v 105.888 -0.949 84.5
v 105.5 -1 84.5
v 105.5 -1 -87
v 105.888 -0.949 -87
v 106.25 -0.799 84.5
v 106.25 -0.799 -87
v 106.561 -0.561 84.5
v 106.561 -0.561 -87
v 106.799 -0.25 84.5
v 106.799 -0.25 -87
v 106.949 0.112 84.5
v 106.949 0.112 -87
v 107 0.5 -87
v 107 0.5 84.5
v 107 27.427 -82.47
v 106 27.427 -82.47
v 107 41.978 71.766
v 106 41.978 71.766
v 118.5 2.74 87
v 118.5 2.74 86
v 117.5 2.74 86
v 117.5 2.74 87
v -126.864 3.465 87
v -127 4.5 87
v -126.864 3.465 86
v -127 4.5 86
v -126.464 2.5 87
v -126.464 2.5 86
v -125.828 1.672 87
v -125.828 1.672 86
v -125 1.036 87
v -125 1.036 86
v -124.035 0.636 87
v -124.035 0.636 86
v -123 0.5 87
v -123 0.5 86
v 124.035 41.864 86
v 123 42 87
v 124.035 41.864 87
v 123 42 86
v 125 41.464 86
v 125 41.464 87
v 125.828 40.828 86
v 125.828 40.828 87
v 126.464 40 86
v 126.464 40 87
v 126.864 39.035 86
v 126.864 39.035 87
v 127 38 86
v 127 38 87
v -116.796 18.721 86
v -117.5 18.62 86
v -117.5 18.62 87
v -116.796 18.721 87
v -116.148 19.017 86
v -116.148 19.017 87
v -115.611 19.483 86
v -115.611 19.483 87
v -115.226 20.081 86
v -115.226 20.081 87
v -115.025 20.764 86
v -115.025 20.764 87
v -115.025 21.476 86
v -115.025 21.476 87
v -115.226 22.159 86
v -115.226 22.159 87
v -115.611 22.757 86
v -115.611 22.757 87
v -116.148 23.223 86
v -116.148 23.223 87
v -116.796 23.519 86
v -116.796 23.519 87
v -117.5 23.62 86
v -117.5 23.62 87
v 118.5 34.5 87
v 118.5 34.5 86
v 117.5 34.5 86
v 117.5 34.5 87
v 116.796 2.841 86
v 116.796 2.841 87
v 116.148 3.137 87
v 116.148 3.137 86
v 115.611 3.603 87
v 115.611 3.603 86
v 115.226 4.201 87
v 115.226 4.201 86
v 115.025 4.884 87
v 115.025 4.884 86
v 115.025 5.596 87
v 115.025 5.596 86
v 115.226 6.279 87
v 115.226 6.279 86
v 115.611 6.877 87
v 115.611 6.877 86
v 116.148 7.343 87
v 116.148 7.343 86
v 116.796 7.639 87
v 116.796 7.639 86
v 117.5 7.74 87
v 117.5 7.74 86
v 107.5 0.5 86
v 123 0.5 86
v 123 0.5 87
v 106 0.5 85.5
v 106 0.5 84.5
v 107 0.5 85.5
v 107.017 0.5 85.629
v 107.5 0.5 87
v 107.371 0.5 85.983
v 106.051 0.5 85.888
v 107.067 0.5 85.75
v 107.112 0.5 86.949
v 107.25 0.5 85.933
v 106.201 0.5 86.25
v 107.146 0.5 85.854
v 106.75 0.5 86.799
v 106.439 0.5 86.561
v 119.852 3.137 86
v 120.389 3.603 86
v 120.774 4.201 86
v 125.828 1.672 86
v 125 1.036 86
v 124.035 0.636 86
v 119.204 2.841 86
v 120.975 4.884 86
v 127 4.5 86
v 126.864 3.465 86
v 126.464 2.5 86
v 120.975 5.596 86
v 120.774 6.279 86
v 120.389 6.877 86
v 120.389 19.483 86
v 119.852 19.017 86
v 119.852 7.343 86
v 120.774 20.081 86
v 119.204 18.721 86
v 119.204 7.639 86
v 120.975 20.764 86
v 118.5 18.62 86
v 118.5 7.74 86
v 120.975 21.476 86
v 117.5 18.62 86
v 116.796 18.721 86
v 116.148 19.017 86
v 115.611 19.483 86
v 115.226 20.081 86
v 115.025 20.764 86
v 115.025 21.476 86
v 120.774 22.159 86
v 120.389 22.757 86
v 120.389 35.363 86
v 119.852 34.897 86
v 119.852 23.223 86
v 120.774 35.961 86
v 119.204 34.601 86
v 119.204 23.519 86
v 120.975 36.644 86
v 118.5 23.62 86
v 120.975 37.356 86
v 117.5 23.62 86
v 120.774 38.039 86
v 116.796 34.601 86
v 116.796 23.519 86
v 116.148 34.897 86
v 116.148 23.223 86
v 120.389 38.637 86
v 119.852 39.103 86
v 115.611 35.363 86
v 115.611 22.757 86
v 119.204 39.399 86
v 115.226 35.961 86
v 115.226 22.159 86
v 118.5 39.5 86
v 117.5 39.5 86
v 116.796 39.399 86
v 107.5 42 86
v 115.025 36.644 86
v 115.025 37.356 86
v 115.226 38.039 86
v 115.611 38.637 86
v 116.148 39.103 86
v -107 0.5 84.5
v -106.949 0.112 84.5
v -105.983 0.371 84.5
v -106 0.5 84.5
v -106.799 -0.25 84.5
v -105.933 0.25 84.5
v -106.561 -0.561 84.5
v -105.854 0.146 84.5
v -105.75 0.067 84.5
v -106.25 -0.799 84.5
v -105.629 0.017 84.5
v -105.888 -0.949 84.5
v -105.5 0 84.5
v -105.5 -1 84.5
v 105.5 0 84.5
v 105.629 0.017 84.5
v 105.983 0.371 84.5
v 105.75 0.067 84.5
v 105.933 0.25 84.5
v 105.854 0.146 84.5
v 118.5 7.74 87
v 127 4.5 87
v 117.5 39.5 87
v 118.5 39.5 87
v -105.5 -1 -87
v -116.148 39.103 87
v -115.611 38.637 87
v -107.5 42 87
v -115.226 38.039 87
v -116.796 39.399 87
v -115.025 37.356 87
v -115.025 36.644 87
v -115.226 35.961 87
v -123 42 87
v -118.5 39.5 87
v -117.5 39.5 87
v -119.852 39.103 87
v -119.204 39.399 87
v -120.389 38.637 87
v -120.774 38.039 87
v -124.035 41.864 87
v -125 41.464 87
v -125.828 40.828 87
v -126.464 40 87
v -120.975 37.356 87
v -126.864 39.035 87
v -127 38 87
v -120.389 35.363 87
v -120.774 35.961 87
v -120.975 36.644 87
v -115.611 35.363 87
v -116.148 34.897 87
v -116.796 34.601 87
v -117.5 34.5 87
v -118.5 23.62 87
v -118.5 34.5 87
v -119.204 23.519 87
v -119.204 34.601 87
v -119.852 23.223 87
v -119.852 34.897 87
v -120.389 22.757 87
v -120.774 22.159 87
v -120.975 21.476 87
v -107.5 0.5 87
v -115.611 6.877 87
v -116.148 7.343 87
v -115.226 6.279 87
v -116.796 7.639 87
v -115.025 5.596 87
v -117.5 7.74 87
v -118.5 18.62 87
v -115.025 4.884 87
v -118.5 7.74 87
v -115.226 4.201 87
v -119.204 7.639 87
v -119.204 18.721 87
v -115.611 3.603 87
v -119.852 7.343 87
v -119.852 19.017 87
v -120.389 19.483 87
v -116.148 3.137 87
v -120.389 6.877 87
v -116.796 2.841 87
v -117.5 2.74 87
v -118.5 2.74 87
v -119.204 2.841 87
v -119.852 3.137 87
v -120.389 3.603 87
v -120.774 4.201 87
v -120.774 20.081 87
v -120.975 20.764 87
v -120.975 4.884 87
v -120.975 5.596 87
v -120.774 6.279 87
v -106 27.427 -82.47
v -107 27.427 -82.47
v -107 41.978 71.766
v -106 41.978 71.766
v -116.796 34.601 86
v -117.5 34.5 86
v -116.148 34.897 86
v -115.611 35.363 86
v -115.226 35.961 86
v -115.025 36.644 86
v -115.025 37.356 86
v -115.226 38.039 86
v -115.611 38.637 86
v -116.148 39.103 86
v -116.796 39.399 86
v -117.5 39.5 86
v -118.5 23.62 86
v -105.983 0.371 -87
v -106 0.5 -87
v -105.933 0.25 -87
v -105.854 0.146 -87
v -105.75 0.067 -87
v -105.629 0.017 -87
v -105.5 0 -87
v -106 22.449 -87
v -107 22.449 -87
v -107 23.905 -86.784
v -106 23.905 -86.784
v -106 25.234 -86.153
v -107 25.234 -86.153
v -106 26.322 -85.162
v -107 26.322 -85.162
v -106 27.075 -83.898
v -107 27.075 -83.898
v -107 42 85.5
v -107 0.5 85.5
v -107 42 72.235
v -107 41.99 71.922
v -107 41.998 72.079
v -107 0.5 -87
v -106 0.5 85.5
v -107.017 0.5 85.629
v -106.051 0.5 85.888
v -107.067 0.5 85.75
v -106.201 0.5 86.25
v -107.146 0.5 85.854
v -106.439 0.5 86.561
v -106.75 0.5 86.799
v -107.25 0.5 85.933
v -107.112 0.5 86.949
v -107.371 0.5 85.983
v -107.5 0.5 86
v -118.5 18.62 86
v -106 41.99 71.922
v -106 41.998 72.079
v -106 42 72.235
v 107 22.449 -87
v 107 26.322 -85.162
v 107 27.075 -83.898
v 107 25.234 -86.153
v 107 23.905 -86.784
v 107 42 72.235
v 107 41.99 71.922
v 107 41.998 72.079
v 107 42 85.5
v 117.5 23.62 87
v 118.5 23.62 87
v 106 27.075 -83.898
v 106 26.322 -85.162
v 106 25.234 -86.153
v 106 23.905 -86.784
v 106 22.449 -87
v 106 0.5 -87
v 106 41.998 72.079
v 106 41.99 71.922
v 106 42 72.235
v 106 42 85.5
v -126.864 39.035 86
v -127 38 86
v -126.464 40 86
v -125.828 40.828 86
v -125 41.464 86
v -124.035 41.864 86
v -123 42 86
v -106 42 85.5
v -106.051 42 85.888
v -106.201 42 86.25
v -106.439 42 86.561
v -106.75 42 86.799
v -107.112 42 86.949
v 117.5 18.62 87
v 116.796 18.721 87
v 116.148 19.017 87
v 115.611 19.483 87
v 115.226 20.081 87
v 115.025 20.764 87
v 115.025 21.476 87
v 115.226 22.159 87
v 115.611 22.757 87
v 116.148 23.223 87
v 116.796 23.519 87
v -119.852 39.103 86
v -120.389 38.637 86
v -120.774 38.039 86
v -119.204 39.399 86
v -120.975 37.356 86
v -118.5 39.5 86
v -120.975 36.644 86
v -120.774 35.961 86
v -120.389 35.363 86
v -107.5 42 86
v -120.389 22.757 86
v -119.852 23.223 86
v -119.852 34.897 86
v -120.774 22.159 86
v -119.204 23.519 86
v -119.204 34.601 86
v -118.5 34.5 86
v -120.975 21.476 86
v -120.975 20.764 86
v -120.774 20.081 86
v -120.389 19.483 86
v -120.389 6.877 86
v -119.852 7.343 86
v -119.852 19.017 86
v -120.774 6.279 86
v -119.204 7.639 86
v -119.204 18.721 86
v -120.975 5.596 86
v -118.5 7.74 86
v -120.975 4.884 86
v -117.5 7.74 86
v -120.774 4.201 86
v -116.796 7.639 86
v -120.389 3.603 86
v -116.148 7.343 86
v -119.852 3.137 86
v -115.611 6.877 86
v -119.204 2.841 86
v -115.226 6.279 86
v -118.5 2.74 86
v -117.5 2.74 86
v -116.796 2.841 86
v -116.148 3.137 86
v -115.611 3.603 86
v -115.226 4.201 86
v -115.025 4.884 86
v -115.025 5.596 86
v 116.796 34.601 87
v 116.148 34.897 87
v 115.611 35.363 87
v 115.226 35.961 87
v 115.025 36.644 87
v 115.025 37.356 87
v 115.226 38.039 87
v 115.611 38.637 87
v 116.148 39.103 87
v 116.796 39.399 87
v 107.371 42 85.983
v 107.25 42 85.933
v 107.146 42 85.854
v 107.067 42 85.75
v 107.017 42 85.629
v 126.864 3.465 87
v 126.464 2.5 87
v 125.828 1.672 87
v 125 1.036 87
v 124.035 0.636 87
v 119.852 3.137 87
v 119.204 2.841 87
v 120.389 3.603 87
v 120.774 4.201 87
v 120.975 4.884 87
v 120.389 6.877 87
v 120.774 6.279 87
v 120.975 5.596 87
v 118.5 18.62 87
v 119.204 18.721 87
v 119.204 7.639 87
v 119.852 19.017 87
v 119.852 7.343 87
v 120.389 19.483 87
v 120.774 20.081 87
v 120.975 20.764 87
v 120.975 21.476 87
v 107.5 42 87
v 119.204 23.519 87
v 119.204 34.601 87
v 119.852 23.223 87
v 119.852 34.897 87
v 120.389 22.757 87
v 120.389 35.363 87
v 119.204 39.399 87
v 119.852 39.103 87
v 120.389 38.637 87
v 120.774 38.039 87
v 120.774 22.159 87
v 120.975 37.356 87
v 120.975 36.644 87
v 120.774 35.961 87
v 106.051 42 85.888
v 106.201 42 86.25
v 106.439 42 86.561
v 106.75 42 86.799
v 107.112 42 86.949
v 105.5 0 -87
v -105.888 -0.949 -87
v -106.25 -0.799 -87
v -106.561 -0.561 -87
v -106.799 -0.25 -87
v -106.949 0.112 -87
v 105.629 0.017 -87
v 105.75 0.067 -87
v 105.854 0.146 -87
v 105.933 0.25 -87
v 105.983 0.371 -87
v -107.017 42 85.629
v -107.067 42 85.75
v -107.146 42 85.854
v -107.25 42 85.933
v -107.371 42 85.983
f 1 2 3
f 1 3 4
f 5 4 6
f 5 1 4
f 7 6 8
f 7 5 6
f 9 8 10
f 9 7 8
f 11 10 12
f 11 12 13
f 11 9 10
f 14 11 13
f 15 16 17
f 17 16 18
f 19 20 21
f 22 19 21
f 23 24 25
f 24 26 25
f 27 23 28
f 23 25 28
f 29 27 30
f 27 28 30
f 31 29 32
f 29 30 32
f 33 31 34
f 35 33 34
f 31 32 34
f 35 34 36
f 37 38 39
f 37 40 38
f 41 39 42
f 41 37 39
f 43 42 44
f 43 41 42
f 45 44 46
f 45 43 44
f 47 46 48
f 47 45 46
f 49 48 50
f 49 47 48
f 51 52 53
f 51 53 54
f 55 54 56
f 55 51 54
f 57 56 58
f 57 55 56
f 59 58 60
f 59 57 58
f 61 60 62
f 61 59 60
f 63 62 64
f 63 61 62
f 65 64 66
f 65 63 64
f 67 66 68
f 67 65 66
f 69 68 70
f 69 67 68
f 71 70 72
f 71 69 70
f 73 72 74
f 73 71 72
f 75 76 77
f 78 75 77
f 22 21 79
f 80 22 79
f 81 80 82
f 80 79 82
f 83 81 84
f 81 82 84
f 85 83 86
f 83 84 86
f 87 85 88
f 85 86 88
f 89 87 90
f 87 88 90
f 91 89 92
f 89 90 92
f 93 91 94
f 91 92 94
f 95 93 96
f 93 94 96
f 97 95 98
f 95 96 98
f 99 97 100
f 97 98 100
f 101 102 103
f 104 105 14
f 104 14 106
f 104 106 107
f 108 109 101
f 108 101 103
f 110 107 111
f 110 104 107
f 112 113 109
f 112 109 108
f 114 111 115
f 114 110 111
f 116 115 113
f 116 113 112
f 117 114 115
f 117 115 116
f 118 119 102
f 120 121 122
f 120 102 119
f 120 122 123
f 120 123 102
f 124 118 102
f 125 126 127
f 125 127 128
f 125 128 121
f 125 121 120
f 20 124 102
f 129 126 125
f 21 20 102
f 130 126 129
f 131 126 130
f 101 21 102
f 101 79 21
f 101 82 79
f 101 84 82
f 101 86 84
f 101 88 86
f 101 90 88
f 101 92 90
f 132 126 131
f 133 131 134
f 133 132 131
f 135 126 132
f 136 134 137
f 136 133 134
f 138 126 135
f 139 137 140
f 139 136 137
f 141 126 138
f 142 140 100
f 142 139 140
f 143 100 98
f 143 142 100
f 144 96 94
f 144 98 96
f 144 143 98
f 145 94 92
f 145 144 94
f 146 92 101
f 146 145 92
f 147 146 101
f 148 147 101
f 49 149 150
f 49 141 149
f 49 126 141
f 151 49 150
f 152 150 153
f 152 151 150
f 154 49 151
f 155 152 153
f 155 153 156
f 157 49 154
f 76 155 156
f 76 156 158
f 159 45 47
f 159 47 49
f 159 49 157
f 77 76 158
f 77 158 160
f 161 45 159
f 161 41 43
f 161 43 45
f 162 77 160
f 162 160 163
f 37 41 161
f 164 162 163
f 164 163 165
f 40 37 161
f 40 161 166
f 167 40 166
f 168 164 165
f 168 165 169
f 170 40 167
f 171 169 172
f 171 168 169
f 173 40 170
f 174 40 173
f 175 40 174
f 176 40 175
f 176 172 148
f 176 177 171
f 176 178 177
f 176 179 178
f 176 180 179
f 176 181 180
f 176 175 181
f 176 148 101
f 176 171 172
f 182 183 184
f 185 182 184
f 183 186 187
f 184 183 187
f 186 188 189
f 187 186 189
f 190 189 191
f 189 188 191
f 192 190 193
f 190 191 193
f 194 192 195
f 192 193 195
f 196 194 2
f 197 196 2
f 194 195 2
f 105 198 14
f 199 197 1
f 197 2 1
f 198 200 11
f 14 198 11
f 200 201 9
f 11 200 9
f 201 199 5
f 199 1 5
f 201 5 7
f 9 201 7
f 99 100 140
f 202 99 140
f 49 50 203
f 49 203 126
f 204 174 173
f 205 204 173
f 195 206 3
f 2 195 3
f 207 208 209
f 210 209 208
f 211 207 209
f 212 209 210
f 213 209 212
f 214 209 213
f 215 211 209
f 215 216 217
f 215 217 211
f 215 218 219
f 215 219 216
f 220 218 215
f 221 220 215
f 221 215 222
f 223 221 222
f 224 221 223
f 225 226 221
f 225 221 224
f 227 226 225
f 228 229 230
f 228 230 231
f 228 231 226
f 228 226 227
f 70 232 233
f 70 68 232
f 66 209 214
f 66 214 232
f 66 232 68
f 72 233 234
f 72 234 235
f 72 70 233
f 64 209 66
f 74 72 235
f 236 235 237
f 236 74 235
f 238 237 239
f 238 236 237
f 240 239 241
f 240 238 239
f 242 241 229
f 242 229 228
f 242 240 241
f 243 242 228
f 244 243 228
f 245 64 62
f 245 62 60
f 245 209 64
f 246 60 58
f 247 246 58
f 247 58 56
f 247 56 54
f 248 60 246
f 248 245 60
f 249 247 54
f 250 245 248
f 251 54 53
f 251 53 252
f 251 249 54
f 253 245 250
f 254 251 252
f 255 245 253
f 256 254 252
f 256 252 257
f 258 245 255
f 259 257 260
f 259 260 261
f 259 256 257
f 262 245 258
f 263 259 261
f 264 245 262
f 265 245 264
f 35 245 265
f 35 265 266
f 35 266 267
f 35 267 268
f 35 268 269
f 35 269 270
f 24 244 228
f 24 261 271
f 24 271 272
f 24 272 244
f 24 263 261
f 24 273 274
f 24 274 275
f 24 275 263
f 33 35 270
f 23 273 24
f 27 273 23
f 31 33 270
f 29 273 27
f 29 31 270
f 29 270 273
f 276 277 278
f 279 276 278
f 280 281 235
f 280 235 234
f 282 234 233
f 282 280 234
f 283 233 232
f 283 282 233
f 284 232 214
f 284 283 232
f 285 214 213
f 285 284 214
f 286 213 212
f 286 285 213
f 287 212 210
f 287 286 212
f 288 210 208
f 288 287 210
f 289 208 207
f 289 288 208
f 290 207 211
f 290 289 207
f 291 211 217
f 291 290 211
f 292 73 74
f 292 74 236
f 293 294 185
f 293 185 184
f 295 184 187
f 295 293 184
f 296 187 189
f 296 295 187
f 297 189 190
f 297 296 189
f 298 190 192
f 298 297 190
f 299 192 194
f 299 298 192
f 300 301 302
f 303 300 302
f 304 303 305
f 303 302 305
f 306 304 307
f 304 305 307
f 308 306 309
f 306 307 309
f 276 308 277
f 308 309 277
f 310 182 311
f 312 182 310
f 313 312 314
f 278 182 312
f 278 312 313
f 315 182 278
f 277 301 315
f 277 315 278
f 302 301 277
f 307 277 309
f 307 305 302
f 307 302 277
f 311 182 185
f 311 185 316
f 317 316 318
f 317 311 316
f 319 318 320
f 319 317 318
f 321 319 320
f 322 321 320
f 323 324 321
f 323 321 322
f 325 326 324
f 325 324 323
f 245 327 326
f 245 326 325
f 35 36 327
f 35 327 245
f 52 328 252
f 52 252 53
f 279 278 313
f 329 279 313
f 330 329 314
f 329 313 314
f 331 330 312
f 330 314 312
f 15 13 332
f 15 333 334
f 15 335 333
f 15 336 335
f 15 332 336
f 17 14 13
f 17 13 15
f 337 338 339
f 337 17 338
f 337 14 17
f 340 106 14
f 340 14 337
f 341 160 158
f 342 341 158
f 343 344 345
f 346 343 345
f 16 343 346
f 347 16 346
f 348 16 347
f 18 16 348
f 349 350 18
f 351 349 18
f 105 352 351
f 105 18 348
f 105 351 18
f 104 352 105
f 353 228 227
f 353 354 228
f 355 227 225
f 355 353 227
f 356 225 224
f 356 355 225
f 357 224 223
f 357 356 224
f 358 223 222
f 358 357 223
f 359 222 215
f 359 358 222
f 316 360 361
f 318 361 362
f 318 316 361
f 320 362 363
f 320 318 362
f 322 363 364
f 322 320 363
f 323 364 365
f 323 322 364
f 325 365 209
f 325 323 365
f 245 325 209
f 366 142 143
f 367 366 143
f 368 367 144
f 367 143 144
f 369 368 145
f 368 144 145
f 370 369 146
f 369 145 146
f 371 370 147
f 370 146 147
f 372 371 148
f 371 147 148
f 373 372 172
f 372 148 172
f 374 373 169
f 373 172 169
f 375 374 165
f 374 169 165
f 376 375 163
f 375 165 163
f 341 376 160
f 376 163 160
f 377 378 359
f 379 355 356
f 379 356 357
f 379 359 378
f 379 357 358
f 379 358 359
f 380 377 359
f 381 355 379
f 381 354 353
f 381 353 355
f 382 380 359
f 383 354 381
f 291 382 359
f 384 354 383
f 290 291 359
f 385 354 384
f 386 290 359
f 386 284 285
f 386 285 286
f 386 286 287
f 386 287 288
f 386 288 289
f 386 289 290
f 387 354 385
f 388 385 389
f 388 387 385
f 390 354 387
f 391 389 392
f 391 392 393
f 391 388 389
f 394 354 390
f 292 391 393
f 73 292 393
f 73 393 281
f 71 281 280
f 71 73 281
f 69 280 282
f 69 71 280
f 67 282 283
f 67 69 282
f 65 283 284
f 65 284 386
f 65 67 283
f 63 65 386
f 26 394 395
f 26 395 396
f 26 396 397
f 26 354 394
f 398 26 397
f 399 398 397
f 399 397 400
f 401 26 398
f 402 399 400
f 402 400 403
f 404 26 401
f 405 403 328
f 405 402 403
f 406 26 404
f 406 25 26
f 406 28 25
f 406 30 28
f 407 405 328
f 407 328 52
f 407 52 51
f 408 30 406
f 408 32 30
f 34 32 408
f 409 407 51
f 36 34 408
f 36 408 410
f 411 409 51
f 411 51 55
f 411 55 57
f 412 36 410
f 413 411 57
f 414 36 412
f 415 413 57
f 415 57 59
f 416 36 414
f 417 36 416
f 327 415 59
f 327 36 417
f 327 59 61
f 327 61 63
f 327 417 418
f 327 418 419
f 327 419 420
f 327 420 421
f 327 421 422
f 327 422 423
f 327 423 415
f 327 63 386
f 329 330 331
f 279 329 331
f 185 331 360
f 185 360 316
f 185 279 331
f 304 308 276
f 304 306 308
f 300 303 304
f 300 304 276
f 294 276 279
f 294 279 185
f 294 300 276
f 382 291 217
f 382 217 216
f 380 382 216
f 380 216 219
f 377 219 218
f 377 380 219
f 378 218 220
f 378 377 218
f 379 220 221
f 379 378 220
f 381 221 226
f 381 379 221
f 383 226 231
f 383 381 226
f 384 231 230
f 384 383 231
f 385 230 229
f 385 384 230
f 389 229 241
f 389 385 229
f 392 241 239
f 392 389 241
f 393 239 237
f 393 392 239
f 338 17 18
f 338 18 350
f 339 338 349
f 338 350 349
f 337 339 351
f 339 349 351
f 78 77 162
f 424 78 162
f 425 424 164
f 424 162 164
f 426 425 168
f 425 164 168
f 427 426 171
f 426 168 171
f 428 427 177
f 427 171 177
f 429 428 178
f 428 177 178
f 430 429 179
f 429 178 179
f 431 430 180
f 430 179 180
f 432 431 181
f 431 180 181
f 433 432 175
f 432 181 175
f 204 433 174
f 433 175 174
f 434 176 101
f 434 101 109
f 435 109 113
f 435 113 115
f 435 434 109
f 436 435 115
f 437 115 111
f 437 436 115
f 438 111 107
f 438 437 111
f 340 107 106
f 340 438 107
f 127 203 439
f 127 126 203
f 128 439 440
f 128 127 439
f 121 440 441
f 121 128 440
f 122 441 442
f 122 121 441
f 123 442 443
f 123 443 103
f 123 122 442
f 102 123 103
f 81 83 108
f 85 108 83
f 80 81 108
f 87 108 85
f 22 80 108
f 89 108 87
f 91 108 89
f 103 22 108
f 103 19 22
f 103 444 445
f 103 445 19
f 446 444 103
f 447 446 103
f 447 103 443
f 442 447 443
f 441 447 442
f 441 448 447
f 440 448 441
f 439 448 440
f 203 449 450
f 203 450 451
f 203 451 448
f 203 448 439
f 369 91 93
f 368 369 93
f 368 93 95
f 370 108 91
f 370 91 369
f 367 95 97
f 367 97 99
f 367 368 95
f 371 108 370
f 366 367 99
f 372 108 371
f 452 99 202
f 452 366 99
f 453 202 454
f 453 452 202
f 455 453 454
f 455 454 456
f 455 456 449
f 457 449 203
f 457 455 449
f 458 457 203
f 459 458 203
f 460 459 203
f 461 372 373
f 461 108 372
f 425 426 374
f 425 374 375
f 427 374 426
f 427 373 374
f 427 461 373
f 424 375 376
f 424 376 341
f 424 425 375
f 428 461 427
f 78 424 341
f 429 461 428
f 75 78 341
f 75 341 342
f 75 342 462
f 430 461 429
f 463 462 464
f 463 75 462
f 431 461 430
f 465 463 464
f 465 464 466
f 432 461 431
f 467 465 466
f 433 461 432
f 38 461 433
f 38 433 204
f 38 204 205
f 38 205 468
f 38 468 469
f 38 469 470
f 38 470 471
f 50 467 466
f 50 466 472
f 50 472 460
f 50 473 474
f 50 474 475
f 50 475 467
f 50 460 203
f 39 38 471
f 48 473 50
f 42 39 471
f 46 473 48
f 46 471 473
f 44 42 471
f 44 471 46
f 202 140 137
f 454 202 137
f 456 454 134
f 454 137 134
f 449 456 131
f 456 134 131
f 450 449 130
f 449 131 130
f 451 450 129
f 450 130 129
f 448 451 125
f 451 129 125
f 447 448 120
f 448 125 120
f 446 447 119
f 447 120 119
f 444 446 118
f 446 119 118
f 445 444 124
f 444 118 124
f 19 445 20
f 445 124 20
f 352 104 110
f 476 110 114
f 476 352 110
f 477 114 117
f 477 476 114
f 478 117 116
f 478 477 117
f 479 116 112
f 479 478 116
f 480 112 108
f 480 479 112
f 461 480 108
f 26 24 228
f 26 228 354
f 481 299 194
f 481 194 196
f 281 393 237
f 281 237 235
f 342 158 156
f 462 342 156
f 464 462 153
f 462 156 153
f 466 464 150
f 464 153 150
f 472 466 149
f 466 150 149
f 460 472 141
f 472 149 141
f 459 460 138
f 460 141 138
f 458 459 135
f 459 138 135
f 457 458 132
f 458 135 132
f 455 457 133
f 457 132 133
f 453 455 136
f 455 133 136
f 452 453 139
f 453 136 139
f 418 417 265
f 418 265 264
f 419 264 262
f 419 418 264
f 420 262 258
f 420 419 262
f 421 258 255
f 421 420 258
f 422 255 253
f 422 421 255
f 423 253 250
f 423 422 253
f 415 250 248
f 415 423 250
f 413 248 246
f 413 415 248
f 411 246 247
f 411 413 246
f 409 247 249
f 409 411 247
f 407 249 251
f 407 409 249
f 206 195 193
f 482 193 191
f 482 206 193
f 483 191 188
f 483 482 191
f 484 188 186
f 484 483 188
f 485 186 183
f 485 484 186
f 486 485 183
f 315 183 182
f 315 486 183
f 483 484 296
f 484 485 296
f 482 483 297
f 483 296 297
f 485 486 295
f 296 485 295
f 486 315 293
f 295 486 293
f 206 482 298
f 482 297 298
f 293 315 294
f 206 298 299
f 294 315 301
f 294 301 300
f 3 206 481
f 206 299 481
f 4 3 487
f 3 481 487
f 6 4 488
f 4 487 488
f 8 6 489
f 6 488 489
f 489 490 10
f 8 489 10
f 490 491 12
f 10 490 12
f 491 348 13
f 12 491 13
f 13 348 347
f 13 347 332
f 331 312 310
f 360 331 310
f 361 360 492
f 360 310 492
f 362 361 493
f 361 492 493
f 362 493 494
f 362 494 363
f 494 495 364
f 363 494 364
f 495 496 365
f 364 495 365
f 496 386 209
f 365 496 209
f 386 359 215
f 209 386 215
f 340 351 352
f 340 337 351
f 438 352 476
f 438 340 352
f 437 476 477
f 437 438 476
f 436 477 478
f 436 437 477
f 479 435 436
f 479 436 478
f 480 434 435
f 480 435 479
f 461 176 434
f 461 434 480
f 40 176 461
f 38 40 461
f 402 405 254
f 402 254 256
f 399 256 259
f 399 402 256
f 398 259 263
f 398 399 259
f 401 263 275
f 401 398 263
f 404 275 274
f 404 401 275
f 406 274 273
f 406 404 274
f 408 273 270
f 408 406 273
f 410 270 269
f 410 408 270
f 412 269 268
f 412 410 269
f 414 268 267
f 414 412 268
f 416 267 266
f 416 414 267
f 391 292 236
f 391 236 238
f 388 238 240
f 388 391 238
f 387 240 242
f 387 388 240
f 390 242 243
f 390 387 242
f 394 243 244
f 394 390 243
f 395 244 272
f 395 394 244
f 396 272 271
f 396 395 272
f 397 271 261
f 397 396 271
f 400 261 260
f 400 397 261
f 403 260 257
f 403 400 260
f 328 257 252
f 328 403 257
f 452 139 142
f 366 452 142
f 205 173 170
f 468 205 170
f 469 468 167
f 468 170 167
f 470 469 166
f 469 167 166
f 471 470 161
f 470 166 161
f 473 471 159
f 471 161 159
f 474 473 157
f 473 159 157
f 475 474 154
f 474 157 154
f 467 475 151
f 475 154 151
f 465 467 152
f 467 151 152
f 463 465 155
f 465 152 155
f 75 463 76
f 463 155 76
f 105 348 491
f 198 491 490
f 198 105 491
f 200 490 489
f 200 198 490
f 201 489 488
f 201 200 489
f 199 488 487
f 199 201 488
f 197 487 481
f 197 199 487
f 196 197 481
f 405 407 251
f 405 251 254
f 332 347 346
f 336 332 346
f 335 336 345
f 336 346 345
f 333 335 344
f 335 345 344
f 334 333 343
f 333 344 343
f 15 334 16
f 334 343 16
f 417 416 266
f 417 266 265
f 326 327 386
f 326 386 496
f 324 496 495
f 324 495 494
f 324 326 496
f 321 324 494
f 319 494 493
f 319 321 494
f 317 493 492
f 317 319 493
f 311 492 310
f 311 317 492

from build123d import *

# Parameters (mm, degrees)
SKETCH1_W                    = 214
SKETCH1_H                    = 174
BASE_FLANGE1_DEPTH           = 1
EDGE_FLANGE3_STRIP_W         = 5
EDGE_FLANGE3_STRIP_H         = 1
EDGE_FLANGE3_STRIP_CUT_DEPTH = 174
EDGE_FLANGE3_DEPTH           = 174
EDGE_FLANGE4_STRIP_W         = 5
EDGE_FLANGE4_STRIP_H         = 1
EDGE_FLANGE4_STRIP_CUT_DEPTH = 174
EDGE_FLANGE4_DEPTH           = 174
EDGE_FLANGE5_STRIP_W         = 5
EDGE_FLANGE5_STRIP_H         = 1
EDGE_FLANGE5_STRIP_CUT_DEPTH = 41.5
EDGE_FLANGE5_DEPTH           = 41.5
EDGE_FLANGE6_STRIP_W         = 5
EDGE_FLANGE6_STRIP_H         = 1
EDGE_FLANGE6_STRIP_CUT_DEPTH = 41.5
EDGE_FLANGE6_DEPTH           = 41.5
FILLET1_R                    = 4
CUT_EXTRUDE1_REACH           = 161.834
SKETCH24_W                   = 214
SKETCH24_H                   = 2.5
SKETCH26_R                   = 2.5
CUT_EXTRUDE2_DEPTH           = 10
CHAMFER1_SIZE                = 1
CUT_EXTRUDE8_DEPTH           = 219.682418132
CUT_EXTRUDE9_DEPTH           = 254.158053397
FILLET2_R                    = 5


# Sheet-metal steps are written as plain solids
with BuildPart() as part:
    # Sketch1 → Base-Flange1 (new body)
    with BuildSketch(Plane(origin=(0, 0, 0), x_dir=(1, 0, 0), z_dir=(0, 1, 0))):
        Rectangle(SKETCH1_W, SKETCH1_H)
    extrude(amount=-BASE_FLANGE1_DEPTH)

    # Edge-Flange3 strip (across the edge) → Edge-Flange3 strip cut (cut)
    with BuildSketch(Plane(origin=(-107, 0, -87), x_dir=(1, 0, 0), z_dir=(0, 0, 1))):
        with Locations((-1, -0.5)):
            Rectangle(EDGE_FLANGE3_STRIP_W, EDGE_FLANGE3_STRIP_H)
    extrude(amount=EDGE_FLANGE3_STRIP_CUT_DEPTH, mode=Mode.SUBTRACT)

    # Edge-Flange3 section (across the edge) → Edge-Flange3 (add)
    with BuildSketch(Plane(origin=(-107, 0, -87), x_dir=(1, 0, 0), z_dir=(0, 0, 1))):
        with BuildLine():
            Line((0, 0.5), (0, 42))
            Line((0, 42), (1, 42))
            Line((1, 42), (1, 0.5))
            ThreePointArc((1, 0.5), (1.146446609, 0.146446609), (1.5, 0))
            Line((1.5, 0), (1.5, -1))
            ThreePointArc((1.5, -1), (0.439339828, -0.560660172), (0, 0.5))
        make_face()
    extrude(amount=EDGE_FLANGE3_DEPTH)

    # Edge-Flange4 strip (across the edge) → Edge-Flange4 strip cut (cut)
    with BuildSketch(Plane(origin=(107, 0, 87), x_dir=(-1, 0, 0), z_dir=(0, 0, -1))):
        with Locations((-1, -0.5)):
            Rectangle(EDGE_FLANGE4_STRIP_W, EDGE_FLANGE4_STRIP_H)
    extrude(amount=EDGE_FLANGE4_STRIP_CUT_DEPTH, mode=Mode.SUBTRACT)

    # Edge-Flange4 section (across the edge) → Edge-Flange4 (add)
    with BuildSketch(Plane(origin=(107, 0, 87), x_dir=(-1, 0, 0), z_dir=(0, 0, -1))):
        with BuildLine():
            Line((0, 0.5), (0, 42))
            Line((0, 42), (1, 42))
            Line((1, 42), (1, 0.5))
            ThreePointArc((1, 0.5), (1.146446609, 0.146446609), (1.5, 0))
            Line((1.5, 0), (1.5, -1))
            ThreePointArc((1.5, -1), (0.439339828, -0.560660172), (0, 0.5))
        make_face()
    extrude(amount=EDGE_FLANGE4_DEPTH)

    # Edge-Flange5 strip (across the edge) → Edge-Flange5 strip cut (cut)
    with BuildSketch(Plane(origin=(107, 42, 87), x_dir=(0, 0, -1), z_dir=(0, -1, 0))):
        with Locations((-1, -0.5)):
            Rectangle(EDGE_FLANGE5_STRIP_W, EDGE_FLANGE5_STRIP_H)
    extrude(amount=EDGE_FLANGE5_STRIP_CUT_DEPTH, mode=Mode.SUBTRACT)

    # Edge-Flange5 section (across the edge) → Edge-Flange5 (add)
    with BuildSketch(Plane(origin=(107, 42, 87), x_dir=(0, 0, -1), z_dir=(0, -1, 0))):
        with BuildLine():
            Line((0, 0.5), (0, 20))
            Line((0, 20), (1, 20))
            Line((1, 20), (1, 0.5))
            ThreePointArc((1, 0.5), (1.146446609, 0.146446609), (1.5, 0))
            Line((1.5, 0), (1.5, -1))
            ThreePointArc((1.5, -1), (0.439339828, -0.560660172), (0, 0.5))
        make_face()
    extrude(amount=EDGE_FLANGE5_DEPTH)

    # Edge-Flange6 strip (across the edge) → Edge-Flange6 strip cut (cut)
    with BuildSketch(Plane(origin=(-107, 0.5, 87), x_dir=(0, 0, -1), z_dir=(0, 1, 0))):
        with Locations((-1, -0.5)):
            Rectangle(EDGE_FLANGE6_STRIP_W, EDGE_FLANGE6_STRIP_H)
    extrude(amount=EDGE_FLANGE6_STRIP_CUT_DEPTH, mode=Mode.SUBTRACT)

    # Edge-Flange6 section (across the edge) → Edge-Flange6 (add)
    with BuildSketch(Plane(origin=(-107, 0.5, 87), x_dir=(0, 0, -1), z_dir=(0, 1, 0))):
        with BuildLine():
            Line((0, 0.5), (0, 20))
            Line((0, 20), (1, 20))
            Line((1, 20), (1, 0.5))
            ThreePointArc((1, 0.5), (1.146446609, 0.146446609), (1.5, 0))
            Line((1.5, 0), (1.5, -1))
            ThreePointArc((1.5, -1), (0.439339828, -0.560660172), (0, 0.5))
        make_face()
    extrude(amount=EDGE_FLANGE6_DEPTH)

    # Fillet1
    fillet1_edges = [part.edges().sort_by_distance(p)[0] for p in [
        (127, 42, 86.5),
        (127, 0.5, 86.5),
        (-127, 0.5, 86.5),
        (-127, 42, 86.5),
    ]]
    fillet(fillet1_edges, radius=FILLET1_R)

    # Cut-Extrude1: up to this face of the body (flat: up to its plane)
    cut_extrude1_end = Plane(part.part.faces().sort_by_distance((114.980552593, 0.5, 86.497536063))[0])
    # Sketch24 → Cut-Extrude1 (cut, up to the picked face)
    with BuildSketch(Plane.XZ.offset(1), mode=Mode.PRIVATE) as cut_extrude1_sk1:
        with Locations((0, 85.75)):
            Rectangle(SKETCH24_W, SKETCH24_H)
    cut_extrude1_tool1 = split(extrude(cut_extrude1_sk1.sketch, amount=-CUT_EXTRUDE1_REACH, mode=Mode.PRIVATE), bisect_by=cut_extrude1_end, keep=Keep.BOTH, mode=Mode.PRIVATE)
    add(cut_extrude1_tool1.solids().sort_by(Axis((0, -1, 85.75), (0, 1, 0)))[0], mode=Mode.SUBTRACT)

    # Sketch26 → Cut-Extrude2 (cut)
    with BuildSketch(Plane.XY.offset(87)):
        with Locations((-118, 37)):
            Circle(SKETCH26_R)
        with Locations((-118, 5.24)):
            Circle(SKETCH26_R)
        with Locations((-118, 21.12)):
            Circle(SKETCH26_R)
        with Locations(Location((118, 5.24, 0), (0, 0, 180))):
            Circle(SKETCH26_R)
        with Locations(Location((118, 21.12, 0), (0, 0, 180))):
            Circle(SKETCH26_R)
        with Locations(Location((118, 37, 0), (0, 0, 180))):
            Circle(SKETCH26_R)
    extrude(amount=-CUT_EXTRUDE2_DEPTH, mode=Mode.SUBTRACT)

    # Chamfer1
    chamfer1_edges = [part.edges().sort_by_distance(p)[0] for p in [
        (-106.5, 42, -87),
        (106.5, 42, -87),
    ]]
    chamfer(chamfer1_edges, length=CHAMFER1_SIZE)

    # Sketch32 → Cut-Extrude8 (cut, through all)
    with BuildSketch(Plane(origin=(0, 0, 86), x_dir=(-1, 0, 0), z_dir=(0, 0, -1))):
        with BuildLine():
            Line((117.5, 39.5), (118.5, 39.5))
            ThreePointArc((118.5, 39.5), (121, 37), (118.5, 34.5))
            Line((118.5, 34.5), (117.5, 34.5))
            ThreePointArc((117.5, 34.5), (115, 37), (117.5, 39.5))
        make_face()
        with BuildLine():
            Line((117.5, 23.62), (118.5, 23.62))
            ThreePointArc((118.5, 23.62), (121, 21.12), (118.5, 18.62))
            Line((118.5, 18.62), (117.5, 18.62))
            ThreePointArc((117.5, 18.62), (115, 21.12), (117.5, 23.62))
        make_face()
        with BuildLine():
            Line((117.5, 7.74), (118.5, 7.74))
            ThreePointArc((118.5, 7.74), (121, 5.24), (118.5, 2.74))
            Line((118.5, 2.74), (117.5, 2.74))
            ThreePointArc((117.5, 2.74), (115, 5.24), (117.5, 7.74))
        make_face()
    cut_extrude8 = extrude(amount=-CUT_EXTRUDE8_DEPTH, mode=Mode.SUBTRACT)

    # Mirror1: Cut-Extrude8 across plane
    add(cut_extrude8.mirror(Plane(origin=(0, 0, 0), x_dir=(0, 0, 1), z_dir=(1, 0, 0))), mode=Mode.SUBTRACT)

    # Sketch41 → Cut-Extrude9 (cut, through all)
    with BuildSketch(Plane.ZY.offset(107)):
        Polygon((-87, 27), (72, 42), (-87, 42), align=None)
    extrude(amount=-CUT_EXTRUDE9_DEPTH, mode=Mode.SUBTRACT)

    # Fillet2
    # the kernel refuses this fillet: 5 mm, written as the material it takes off along each edge
    with BuildSketch(Plane(origin=(105.411683458, 42, 72), x_dir=(0, -0.09392259459562911, -0.9955795027140852), z_dir=(1, 0, 0))) as fillet2_piece_1:
        with BuildLine():
            CenterArc((FILLET2_R * 0.0470653233649, -FILLET2_R), FILLET2_R, 90, 5.38931176)
            Line((-FILLET2_R * 0.0468572712307, -FILLET2_R * 0.00442049728592), (0, 0))
            Line((0, 0), (FILLET2_R * 0.0470653233649, 0))
        make_face()
    extrude(amount=2.176633084, mode=Mode.SUBTRACT)
    with BuildSketch(Plane(origin=(-107.588316542, 42, 72), x_dir=(0, 0, 1), z_dir=(1, 0, 0))) as fillet2_piece_2:
        with BuildLine():
            CenterArc((FILLET2_R * 0.0470653233649, FILLET2_R), FILLET2_R, 264.61068824, 5.38931176)
            Line((-FILLET2_R * 0.0468572712307, FILLET2_R * 0.00442049728592), (0, 0))
            Line((0, 0), (FILLET2_R * 0.0470653233649, 0))
        make_face()
    extrude(amount=2.176633084, mode=Mode.SUBTRACT)
    with BuildSketch(Plane(origin=(94.623743722, 27, -87), x_dir=(0, -1, 0), z_dir=(1, 0, 0))) as fillet2_piece_3:
        with BuildLine():
            CenterArc((FILLET2_R * 0.910100502204, -FILLET2_R), FILLET2_R, 90, 84.61068824)
            Line((-FILLET2_R * 0.0854790005098, -FILLET2_R * 0.906077405404), (0, 0))
            Line((0, 0), (FILLET2_R * 0.910100502204, 0))
        make_face()
    extrude(amount=23.752512555, mode=Mode.SUBTRACT)
    with BuildSketch(Plane(origin=(-118.376256278, 27, -87), x_dir=(0, 0.0939225945956684, 0.9955795027140816), z_dir=(1, 0, 0))) as fillet2_piece_4:
        with BuildLine():
            CenterArc((FILLET2_R * 0.910100502204, FILLET2_R), FILLET2_R, 185.38931176, 84.61068824)
            Line((-FILLET2_R * 0.0854790005098, FILLET2_R * 0.906077405404), (0, 0))
            Line((0, 0), (FILLET2_R * 0.910100502204, 0))
        make_face()
    extrude(amount=23.752512555, mode=Mode.SUBTRACT)


solid = part.part
